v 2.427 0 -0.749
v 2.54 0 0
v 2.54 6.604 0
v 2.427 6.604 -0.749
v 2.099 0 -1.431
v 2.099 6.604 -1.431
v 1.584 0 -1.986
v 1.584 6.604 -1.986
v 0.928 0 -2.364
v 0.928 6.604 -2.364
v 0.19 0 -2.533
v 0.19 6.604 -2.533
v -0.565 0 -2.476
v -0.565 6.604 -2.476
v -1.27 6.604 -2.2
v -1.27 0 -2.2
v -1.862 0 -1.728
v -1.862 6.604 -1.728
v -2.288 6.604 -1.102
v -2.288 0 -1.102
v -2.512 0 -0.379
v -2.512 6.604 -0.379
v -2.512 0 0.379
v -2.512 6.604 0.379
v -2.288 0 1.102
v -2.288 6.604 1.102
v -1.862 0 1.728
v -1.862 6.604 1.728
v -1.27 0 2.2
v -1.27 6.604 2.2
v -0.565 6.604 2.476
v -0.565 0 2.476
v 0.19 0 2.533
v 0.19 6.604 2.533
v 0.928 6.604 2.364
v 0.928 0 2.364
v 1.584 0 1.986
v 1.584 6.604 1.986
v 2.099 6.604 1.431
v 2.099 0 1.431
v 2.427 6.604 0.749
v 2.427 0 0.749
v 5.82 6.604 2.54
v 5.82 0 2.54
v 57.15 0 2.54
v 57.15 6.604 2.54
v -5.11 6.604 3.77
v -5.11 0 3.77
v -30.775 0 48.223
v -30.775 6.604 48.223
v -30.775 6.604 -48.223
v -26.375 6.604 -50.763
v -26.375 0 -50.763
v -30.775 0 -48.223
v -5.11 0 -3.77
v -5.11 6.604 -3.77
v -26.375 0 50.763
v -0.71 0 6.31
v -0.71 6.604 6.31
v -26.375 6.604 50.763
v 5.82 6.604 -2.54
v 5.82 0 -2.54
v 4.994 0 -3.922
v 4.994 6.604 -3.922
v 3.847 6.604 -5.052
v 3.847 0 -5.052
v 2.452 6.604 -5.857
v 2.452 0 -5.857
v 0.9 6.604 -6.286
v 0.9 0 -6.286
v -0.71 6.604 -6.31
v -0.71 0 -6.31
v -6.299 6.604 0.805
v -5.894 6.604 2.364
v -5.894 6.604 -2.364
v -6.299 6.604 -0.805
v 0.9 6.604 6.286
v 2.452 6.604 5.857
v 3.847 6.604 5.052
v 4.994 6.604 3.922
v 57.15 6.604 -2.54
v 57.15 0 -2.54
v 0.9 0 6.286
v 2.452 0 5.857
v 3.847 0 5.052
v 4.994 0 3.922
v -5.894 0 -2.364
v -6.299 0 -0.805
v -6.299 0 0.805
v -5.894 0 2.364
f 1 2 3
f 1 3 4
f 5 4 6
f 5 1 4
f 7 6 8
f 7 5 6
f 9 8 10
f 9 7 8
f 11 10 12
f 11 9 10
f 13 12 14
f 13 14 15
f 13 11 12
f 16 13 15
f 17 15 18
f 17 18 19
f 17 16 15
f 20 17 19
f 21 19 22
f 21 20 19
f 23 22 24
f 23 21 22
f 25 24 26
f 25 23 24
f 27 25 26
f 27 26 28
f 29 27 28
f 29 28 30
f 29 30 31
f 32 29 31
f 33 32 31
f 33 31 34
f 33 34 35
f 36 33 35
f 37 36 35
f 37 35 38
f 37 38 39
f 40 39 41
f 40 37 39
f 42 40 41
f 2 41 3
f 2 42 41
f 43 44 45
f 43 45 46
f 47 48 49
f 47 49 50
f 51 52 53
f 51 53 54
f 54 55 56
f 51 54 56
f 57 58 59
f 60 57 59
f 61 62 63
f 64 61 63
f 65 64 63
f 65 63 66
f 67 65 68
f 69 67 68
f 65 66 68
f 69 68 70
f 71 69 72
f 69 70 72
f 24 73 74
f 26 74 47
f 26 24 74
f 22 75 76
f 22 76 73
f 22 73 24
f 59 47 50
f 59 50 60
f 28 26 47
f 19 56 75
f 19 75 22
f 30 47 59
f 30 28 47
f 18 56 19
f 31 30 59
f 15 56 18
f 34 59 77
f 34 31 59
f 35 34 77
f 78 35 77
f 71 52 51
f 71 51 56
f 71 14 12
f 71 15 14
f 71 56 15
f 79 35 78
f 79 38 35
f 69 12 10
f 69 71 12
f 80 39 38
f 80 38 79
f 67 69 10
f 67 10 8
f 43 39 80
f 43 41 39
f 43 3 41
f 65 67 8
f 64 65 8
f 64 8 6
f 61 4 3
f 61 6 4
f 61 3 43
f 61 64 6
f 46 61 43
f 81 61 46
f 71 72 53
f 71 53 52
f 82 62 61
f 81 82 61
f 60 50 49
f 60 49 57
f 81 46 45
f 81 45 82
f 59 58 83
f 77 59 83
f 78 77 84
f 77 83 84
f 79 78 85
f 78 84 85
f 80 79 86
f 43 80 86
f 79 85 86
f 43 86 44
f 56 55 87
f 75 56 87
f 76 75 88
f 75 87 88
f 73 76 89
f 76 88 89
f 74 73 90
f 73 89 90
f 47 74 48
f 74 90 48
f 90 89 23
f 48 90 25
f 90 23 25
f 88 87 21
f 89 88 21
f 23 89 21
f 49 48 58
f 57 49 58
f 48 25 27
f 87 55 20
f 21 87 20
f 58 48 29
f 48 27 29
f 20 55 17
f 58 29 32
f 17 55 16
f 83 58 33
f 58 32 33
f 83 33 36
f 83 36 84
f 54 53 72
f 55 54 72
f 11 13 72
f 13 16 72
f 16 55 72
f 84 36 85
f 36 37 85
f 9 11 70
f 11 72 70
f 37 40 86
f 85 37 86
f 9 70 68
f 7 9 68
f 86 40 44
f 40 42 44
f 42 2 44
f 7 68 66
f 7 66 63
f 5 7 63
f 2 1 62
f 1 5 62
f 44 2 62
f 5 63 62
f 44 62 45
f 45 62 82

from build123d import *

# Parameters (mm, degrees)
SKETCH1_R           = 6.35
SKETCH1_R_2         = 2.54
BOSS_EXTRUDE1_DEPTH = 6.604
BOSS_EXTRUDE2_START = -0.530129
SKETCH2_W           = 5.08
SKETCH2_H           = 6.604
BOSS_EXTRUDE2_DEPTH = 51.330129
CIRPATTERN1_COUNT   = 3


with BuildPart() as part:
    # Sketch1 → Boss-Extrude1 (new body)
    with BuildSketch(Plane(origin=(0, 0, 0), x_dir=(1, 0, 0), z_dir=(0, 1, 0))):
        Circle(SKETCH1_R)
        Circle(SKETCH1_R_2, mode=Mode.SUBTRACT)
    extrude(amount=BOSS_EXTRUDE1_DEPTH)

    # Sketch2 → Boss-Extrude2 (add)
    with BuildSketch(Plane(origin=(6.35, 0, 0), x_dir=(0, 0, -1), z_dir=(1, 0, 0)).offset(BOSS_EXTRUDE2_START)):
        with Locations((0, 3.302)):
            Rectangle(SKETCH2_W, SKETCH2_H)
    boss_extrude2 = extrude(amount=BOSS_EXTRUDE2_DEPTH)

    # CirPattern1: Boss-Extrude2 ×3 about axis
    cirpattern1_axis = Axis((0, 0, 0), (0, 1, 0))
    for i in range(1, CIRPATTERN1_COUNT):
        add(boss_extrude2.rotate(cirpattern1_axis, i * 360 / CIRPATTERN1_COUNT))


solid = part.part
